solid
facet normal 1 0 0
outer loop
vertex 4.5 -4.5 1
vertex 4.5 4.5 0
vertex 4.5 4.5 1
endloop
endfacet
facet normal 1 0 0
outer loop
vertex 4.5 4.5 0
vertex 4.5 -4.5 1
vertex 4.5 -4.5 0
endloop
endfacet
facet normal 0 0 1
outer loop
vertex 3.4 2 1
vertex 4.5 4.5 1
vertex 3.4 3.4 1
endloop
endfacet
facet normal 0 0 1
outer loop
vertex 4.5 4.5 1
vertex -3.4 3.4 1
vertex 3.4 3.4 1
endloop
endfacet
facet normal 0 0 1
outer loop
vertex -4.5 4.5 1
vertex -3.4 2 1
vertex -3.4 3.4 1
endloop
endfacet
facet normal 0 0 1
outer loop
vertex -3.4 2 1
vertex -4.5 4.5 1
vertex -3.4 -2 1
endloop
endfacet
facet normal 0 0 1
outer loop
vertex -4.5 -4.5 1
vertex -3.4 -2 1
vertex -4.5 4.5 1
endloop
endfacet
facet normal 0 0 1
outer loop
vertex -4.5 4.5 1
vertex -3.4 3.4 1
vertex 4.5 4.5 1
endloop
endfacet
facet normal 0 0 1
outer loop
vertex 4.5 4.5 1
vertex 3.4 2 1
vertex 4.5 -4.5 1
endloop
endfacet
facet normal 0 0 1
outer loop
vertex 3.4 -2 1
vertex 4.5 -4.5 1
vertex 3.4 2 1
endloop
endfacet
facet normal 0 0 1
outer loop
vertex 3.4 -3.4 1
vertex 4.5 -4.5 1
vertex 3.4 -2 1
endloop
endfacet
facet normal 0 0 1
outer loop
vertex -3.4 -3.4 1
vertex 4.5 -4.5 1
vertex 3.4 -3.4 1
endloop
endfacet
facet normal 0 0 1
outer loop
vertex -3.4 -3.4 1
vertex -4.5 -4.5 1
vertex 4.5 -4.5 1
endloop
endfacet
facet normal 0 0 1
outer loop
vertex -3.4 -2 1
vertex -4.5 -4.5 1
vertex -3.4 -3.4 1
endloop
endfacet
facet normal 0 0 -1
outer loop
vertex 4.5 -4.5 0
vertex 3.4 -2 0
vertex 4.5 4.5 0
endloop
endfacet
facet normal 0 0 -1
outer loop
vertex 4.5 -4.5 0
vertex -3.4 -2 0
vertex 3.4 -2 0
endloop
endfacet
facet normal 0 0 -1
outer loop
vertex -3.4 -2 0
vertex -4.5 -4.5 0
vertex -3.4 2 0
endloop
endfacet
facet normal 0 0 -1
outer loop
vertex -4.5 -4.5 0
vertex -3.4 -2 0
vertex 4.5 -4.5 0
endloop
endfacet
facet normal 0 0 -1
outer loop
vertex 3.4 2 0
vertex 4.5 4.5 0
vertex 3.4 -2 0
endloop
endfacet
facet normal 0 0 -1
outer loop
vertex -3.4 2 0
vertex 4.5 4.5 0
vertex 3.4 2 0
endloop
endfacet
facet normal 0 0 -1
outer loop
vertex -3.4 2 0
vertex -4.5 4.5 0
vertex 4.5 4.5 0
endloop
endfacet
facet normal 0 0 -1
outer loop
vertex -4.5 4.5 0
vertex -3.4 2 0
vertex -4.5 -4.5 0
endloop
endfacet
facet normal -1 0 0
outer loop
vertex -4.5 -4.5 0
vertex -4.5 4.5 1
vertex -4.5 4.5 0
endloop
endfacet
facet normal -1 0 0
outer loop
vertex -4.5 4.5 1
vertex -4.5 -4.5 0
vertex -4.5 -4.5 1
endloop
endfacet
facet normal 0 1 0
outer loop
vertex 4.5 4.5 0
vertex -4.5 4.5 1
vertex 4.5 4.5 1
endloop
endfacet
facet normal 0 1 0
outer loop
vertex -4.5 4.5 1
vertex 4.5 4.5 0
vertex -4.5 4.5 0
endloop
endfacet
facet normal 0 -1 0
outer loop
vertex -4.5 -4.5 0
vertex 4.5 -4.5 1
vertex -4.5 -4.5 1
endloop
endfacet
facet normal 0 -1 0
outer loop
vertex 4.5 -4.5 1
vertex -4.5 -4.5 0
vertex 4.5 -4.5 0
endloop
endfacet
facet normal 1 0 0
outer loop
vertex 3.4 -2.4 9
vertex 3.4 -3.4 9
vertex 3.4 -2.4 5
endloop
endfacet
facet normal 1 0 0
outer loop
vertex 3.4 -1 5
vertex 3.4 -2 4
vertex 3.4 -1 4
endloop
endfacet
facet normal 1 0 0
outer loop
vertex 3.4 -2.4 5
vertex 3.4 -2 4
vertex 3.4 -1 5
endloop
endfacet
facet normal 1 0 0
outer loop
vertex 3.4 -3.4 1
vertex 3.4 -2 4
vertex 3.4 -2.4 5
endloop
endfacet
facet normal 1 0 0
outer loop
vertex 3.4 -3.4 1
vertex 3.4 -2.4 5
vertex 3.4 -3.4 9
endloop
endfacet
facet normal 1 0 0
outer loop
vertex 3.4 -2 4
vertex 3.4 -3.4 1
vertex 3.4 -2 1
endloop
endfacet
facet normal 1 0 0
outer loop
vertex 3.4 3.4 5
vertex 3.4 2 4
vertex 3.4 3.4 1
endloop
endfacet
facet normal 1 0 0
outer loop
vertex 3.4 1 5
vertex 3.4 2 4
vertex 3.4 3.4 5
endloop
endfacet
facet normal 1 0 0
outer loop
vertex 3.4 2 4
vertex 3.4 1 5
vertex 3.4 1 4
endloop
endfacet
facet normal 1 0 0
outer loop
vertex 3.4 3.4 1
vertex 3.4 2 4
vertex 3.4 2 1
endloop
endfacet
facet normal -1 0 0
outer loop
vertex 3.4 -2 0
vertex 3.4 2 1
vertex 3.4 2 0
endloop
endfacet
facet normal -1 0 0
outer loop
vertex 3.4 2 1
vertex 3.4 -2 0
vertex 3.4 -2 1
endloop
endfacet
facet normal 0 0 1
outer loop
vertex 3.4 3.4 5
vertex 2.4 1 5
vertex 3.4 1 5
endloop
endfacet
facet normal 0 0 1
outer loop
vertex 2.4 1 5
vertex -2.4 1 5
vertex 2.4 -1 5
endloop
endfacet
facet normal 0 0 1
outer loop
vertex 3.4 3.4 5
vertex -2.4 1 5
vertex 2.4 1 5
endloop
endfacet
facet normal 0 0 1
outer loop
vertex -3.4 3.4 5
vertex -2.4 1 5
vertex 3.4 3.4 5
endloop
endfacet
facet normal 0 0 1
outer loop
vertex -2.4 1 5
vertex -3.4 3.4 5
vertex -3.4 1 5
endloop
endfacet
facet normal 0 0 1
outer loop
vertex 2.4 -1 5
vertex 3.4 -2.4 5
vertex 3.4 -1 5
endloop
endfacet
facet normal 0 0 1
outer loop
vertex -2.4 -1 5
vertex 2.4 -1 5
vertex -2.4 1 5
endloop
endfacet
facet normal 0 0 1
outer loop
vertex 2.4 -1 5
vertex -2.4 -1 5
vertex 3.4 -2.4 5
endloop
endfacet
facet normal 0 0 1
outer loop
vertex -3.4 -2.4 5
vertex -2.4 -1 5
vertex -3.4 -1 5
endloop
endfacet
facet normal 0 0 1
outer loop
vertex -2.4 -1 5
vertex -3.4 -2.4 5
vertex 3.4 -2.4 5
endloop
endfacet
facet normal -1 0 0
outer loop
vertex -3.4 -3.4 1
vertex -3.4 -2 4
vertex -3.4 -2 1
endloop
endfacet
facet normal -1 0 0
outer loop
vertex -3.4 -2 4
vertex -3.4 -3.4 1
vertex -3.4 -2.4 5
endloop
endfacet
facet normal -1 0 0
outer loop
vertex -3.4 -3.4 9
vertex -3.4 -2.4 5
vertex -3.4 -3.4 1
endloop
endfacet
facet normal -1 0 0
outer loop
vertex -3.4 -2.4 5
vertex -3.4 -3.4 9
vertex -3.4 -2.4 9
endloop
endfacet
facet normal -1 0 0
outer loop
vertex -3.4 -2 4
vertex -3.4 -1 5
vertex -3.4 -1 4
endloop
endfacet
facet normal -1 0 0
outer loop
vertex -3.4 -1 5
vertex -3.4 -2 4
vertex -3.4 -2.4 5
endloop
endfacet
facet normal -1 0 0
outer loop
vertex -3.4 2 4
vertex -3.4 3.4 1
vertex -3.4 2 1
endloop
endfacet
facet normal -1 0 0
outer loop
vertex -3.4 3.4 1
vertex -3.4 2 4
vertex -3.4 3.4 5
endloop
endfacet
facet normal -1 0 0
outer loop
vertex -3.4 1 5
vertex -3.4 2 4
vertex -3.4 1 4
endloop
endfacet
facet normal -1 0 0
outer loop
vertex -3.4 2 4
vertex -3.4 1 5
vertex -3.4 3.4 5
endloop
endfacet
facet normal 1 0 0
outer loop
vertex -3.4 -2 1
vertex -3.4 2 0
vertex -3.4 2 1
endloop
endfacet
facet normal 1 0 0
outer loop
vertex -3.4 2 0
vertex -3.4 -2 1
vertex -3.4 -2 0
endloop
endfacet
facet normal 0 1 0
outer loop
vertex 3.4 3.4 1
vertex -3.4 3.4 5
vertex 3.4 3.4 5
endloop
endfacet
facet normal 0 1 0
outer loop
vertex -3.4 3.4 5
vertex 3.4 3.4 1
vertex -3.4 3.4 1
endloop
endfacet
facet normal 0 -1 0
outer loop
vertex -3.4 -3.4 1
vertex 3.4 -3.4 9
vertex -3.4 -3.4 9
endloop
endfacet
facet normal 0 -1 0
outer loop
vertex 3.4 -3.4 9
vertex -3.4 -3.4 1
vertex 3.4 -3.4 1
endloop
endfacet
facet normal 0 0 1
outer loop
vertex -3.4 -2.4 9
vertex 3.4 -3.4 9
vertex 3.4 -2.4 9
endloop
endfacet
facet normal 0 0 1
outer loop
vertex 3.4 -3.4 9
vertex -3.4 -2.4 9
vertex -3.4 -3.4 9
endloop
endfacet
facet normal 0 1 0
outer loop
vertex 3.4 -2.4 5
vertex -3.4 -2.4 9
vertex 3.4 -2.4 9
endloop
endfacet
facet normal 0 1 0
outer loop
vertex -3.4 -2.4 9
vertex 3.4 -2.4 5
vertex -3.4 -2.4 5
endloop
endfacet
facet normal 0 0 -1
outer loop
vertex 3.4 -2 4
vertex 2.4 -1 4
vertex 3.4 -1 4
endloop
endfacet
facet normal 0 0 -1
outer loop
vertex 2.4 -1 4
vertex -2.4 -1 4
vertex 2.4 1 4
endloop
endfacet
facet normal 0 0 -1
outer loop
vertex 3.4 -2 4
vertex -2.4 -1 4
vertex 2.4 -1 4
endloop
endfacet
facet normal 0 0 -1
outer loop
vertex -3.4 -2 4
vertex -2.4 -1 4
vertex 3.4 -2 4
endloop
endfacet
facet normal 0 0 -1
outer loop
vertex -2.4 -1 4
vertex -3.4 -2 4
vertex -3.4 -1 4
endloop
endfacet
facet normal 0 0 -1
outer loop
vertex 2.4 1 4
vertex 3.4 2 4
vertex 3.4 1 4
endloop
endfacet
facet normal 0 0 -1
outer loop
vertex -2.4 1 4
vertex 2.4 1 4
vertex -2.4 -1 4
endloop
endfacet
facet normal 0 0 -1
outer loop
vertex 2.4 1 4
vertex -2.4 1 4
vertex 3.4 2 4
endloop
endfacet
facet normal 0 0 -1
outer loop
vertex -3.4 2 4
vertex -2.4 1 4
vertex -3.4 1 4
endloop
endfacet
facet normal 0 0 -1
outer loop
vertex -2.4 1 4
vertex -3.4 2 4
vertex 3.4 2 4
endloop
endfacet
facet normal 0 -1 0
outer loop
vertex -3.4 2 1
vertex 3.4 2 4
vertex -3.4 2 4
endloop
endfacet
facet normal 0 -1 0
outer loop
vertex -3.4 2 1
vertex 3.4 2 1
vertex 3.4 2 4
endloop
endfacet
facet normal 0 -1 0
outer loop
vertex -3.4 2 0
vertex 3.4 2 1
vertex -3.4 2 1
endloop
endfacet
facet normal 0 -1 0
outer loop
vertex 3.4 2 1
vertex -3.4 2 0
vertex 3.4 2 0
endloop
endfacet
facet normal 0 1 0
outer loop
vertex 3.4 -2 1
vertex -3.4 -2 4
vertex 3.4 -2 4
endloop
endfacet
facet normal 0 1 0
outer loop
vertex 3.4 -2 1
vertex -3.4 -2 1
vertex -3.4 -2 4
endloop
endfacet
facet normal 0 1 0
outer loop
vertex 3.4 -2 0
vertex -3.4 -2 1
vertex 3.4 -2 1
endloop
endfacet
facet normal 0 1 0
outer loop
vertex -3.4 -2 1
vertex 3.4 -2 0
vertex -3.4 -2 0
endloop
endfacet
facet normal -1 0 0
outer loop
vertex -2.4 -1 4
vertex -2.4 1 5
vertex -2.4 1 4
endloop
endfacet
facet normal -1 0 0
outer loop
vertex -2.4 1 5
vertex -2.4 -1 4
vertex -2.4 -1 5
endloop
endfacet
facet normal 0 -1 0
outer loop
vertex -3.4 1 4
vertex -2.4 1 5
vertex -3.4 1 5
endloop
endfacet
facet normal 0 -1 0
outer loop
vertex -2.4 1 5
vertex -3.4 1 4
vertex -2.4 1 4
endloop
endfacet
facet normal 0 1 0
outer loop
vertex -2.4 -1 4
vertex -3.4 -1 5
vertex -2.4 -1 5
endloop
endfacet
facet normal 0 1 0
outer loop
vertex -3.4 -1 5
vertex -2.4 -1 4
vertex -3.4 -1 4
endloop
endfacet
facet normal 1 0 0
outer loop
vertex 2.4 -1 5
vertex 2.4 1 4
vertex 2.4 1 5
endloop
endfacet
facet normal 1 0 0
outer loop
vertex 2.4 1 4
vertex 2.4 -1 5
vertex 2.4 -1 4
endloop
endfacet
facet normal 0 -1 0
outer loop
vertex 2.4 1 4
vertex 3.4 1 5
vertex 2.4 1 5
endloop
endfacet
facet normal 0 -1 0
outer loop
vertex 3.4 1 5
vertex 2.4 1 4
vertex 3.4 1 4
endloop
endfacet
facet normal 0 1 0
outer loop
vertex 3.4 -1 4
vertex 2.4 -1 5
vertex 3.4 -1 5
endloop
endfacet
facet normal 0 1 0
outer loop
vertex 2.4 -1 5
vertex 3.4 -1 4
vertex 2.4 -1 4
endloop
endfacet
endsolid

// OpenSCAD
sx=6.8;

module draw_holder() {
    translate([-9/2,-9/2,0]) cube([9,9,1]);        
    translate([-sx/2,-sx/2, 1]) cube([sx,sx,4]);
    translate([-sx/2,-sx/2, 5]) cube([sx,1,4]);
}

difference() {
    draw_holder();
    translate([-sx/2,-4/2,0]) cube([sx,4, 4]);
    translate([-sx/2,-1,0]) cube([1,2, 10]);
    translate([sx/2-1,-1,0]) cube([1,2, 10]);
}
